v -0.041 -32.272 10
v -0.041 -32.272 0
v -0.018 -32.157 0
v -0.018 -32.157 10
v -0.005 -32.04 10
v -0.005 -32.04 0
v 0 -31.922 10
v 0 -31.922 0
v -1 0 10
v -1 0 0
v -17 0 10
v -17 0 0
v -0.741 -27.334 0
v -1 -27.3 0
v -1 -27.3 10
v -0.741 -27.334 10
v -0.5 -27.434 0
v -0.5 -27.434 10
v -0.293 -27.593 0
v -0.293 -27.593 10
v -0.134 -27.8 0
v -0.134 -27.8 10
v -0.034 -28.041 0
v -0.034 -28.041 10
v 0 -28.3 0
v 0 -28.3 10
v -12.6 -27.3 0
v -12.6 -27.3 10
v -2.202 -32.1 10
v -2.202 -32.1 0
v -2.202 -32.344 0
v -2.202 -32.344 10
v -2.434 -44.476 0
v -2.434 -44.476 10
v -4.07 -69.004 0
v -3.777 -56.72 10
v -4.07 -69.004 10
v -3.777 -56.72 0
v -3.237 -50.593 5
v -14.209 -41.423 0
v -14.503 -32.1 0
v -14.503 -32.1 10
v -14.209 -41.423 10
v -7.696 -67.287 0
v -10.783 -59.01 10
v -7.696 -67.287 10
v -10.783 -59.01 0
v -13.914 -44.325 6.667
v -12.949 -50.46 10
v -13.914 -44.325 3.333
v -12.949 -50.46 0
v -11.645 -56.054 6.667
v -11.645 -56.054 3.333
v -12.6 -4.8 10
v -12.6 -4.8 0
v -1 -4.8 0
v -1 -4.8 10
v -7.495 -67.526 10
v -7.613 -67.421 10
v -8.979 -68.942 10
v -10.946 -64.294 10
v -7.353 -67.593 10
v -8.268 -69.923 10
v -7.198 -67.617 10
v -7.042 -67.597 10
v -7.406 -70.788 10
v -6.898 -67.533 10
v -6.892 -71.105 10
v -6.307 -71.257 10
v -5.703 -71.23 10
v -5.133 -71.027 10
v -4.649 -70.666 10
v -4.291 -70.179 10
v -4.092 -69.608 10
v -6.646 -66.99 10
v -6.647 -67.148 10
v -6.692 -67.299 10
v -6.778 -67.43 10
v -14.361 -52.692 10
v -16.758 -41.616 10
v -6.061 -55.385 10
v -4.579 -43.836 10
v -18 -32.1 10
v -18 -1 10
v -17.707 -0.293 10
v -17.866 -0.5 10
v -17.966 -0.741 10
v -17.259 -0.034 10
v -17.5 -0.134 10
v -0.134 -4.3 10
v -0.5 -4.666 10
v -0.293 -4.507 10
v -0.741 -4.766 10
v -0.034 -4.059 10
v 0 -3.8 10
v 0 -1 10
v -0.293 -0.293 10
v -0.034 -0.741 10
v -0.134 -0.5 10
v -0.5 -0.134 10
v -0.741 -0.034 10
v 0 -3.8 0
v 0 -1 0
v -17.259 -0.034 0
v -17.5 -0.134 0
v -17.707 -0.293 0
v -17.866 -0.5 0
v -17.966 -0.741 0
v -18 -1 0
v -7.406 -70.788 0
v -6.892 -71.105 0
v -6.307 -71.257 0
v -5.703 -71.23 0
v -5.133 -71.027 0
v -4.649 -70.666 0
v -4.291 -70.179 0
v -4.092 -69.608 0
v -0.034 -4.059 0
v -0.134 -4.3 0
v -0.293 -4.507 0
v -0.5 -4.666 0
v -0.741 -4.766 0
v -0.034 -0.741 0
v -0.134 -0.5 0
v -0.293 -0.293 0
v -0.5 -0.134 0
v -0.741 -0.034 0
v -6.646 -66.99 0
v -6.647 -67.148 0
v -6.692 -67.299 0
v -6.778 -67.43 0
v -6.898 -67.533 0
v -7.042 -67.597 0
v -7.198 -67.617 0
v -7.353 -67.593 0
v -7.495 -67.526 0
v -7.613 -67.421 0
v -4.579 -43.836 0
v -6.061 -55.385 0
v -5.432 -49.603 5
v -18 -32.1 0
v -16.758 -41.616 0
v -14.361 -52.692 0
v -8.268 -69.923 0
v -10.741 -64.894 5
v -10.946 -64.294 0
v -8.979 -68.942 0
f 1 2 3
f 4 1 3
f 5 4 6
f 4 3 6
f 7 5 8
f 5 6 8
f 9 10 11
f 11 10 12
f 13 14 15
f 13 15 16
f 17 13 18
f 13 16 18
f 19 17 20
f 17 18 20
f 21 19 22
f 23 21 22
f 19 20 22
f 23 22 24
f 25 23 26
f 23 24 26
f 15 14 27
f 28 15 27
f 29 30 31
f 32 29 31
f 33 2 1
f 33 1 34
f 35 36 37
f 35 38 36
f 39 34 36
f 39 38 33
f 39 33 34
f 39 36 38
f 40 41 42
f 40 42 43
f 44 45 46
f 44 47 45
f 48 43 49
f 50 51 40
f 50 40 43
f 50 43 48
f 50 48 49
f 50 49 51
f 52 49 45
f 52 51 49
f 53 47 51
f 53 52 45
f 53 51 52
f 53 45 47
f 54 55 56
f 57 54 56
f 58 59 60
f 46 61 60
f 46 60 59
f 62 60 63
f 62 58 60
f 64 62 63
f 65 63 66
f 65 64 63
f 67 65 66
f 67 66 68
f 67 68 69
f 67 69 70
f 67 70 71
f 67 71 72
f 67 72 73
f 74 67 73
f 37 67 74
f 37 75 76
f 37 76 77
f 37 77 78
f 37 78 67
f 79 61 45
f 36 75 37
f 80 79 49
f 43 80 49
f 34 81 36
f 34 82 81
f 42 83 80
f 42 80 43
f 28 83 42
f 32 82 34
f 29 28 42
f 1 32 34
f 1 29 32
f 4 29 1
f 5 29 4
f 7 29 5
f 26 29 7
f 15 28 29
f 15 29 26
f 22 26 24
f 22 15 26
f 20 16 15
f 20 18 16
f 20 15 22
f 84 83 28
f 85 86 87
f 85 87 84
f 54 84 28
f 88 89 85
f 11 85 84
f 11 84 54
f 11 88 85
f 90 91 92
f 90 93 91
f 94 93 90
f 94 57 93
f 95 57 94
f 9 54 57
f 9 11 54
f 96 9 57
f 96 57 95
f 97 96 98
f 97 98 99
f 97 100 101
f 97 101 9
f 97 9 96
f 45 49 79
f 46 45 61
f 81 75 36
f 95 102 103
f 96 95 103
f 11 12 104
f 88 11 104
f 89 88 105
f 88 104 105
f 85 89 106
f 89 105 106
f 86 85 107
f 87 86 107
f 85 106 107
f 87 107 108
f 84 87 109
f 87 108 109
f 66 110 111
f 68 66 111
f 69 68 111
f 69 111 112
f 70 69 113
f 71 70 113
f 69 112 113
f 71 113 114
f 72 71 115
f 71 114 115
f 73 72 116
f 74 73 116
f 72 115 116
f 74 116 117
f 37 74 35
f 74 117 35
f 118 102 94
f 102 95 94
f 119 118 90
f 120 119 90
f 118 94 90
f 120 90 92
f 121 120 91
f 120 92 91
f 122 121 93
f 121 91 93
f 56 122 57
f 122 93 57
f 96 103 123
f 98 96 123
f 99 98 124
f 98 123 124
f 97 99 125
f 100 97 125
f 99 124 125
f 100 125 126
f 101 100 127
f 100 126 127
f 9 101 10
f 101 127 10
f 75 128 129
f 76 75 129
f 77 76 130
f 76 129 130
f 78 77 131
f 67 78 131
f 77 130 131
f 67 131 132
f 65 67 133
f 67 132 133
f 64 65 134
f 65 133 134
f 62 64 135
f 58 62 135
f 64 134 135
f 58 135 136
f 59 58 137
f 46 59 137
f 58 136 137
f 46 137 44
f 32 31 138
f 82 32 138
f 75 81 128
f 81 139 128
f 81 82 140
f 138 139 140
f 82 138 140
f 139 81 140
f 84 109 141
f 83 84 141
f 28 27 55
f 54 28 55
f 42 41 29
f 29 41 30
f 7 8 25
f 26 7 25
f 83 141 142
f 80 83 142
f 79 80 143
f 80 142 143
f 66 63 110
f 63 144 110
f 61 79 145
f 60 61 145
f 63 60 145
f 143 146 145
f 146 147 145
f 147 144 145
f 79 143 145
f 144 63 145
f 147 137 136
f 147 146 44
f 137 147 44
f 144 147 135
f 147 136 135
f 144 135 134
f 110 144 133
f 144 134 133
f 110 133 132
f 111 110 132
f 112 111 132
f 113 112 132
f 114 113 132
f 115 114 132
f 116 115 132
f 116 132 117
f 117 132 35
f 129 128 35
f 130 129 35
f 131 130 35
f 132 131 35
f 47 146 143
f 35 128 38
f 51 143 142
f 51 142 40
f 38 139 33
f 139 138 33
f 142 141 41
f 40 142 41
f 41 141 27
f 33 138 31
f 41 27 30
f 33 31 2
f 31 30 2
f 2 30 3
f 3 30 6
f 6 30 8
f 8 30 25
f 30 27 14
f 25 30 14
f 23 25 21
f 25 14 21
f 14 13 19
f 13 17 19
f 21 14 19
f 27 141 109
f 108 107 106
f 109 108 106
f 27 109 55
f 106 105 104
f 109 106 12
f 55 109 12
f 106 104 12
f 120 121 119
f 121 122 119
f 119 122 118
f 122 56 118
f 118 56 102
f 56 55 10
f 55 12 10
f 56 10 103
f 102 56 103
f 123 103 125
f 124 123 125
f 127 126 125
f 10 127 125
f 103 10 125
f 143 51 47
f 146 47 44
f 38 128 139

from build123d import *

# Parameters (mm, degrees)
EXTRUDE_1_DEPTH = 10
FILLET_2_R      = 1


with BuildPart() as part:
    # 草图1 → 凸台-拉伸1 (new body)
    with BuildSketch(Plane.XY):
        with BuildLine():
            Line((-1, 0), (-17, 0))
            ThreePointArc((-17, 0), (-17.707106781, -0.292893219), (-18, -1))
            Line((-18, -1), (-18, -32.1))
            add(Edge.make_bspline(
                [(-18, -32.1), (-17.398957494, -40.620033007), (-14.024039593, -56.364300347), (-9.146815425, -69.320325423), (-7.406396999, -70.788082272)],
                knots=[0, 0, 0, 0, 0.832203733, 1, 1, 1, 1], degree=3))
            ThreePointArc((-7.406396999, -70.788082272), (-5.133384432, -71.027159545), (-4.069948517, -69.004080671))
            add(Edge.make_bspline(
                [(-0.041239115, -32.271780397), (-1.500018129, -38.363838214), (-3.630248711, -50.577946078), (-4.185824398, -62.852038397), (-4.069948517, -69.004080671)],
                knots=[0.004175579, 0.004175579, 0.004175579, 0.004175579, 0.448416271, 0.892656962, 0.892656962, 0.892656962, 0.892656962], degree=3))
            ThreePointArc((-0.041239115, -32.271780397), (-0.010345455, -32.098338919), (0, -31.922471537))
            Line((0, -31.922471537), (0, -27.3))
            Line((0, -27.3), (-12.6, -27.3))
            Line((-12.6, -27.3), (-12.6, -4.8))
            Line((-12.6, -4.8), (0, -4.8))
            Line((0, -4.8), (0, -1))
            ThreePointArc((0, -1), (-0.292893219, -0.292893219), (-1, 0))
        make_face()
        with BuildLine():
            Line((-14.502921195, -32.1), (-2.20164077, -32.1))
            Line((-2.20164077, -32.1), (-2.20164077, -32.343989367))
            add(Edge.make_bspline(
                [(-2.20164077, -32.343989367), (-6.440587853, -49.539532595), (-6.646462239, -66.99036895)],
                knots=[0, 0, 0, 0.915733772, 0.915733772, 0.915733772], degree=2))
            ThreePointArc((-6.646462239, -66.99036895), (-7.041555359, -67.59672648), (-7.695713933, -67.28713871))
            add(Edge.make_bspline(
                [(-14.502921195, -32.1), (-14.753514705, -44.573225705), (-12.484445617, -56.302271942), (-7.695713933, -67.28713871)],
                knots=[0, 0, 0, 0, 1, 1, 1, 1], degree=3))
        make_face(mode=Mode.SUBTRACT)
    extrude(amount=EXTRUDE_1_DEPTH)

    # 圆角2
    fillet_2_edges = [part.edges().sort_by_distance(p)[0] for p in [
        (0, -4.8, 5),
        (0, -27.3, 5),
    ]]
    fillet(fillet_2_edges, radius=FILLET_2_R)


solid = part.part
